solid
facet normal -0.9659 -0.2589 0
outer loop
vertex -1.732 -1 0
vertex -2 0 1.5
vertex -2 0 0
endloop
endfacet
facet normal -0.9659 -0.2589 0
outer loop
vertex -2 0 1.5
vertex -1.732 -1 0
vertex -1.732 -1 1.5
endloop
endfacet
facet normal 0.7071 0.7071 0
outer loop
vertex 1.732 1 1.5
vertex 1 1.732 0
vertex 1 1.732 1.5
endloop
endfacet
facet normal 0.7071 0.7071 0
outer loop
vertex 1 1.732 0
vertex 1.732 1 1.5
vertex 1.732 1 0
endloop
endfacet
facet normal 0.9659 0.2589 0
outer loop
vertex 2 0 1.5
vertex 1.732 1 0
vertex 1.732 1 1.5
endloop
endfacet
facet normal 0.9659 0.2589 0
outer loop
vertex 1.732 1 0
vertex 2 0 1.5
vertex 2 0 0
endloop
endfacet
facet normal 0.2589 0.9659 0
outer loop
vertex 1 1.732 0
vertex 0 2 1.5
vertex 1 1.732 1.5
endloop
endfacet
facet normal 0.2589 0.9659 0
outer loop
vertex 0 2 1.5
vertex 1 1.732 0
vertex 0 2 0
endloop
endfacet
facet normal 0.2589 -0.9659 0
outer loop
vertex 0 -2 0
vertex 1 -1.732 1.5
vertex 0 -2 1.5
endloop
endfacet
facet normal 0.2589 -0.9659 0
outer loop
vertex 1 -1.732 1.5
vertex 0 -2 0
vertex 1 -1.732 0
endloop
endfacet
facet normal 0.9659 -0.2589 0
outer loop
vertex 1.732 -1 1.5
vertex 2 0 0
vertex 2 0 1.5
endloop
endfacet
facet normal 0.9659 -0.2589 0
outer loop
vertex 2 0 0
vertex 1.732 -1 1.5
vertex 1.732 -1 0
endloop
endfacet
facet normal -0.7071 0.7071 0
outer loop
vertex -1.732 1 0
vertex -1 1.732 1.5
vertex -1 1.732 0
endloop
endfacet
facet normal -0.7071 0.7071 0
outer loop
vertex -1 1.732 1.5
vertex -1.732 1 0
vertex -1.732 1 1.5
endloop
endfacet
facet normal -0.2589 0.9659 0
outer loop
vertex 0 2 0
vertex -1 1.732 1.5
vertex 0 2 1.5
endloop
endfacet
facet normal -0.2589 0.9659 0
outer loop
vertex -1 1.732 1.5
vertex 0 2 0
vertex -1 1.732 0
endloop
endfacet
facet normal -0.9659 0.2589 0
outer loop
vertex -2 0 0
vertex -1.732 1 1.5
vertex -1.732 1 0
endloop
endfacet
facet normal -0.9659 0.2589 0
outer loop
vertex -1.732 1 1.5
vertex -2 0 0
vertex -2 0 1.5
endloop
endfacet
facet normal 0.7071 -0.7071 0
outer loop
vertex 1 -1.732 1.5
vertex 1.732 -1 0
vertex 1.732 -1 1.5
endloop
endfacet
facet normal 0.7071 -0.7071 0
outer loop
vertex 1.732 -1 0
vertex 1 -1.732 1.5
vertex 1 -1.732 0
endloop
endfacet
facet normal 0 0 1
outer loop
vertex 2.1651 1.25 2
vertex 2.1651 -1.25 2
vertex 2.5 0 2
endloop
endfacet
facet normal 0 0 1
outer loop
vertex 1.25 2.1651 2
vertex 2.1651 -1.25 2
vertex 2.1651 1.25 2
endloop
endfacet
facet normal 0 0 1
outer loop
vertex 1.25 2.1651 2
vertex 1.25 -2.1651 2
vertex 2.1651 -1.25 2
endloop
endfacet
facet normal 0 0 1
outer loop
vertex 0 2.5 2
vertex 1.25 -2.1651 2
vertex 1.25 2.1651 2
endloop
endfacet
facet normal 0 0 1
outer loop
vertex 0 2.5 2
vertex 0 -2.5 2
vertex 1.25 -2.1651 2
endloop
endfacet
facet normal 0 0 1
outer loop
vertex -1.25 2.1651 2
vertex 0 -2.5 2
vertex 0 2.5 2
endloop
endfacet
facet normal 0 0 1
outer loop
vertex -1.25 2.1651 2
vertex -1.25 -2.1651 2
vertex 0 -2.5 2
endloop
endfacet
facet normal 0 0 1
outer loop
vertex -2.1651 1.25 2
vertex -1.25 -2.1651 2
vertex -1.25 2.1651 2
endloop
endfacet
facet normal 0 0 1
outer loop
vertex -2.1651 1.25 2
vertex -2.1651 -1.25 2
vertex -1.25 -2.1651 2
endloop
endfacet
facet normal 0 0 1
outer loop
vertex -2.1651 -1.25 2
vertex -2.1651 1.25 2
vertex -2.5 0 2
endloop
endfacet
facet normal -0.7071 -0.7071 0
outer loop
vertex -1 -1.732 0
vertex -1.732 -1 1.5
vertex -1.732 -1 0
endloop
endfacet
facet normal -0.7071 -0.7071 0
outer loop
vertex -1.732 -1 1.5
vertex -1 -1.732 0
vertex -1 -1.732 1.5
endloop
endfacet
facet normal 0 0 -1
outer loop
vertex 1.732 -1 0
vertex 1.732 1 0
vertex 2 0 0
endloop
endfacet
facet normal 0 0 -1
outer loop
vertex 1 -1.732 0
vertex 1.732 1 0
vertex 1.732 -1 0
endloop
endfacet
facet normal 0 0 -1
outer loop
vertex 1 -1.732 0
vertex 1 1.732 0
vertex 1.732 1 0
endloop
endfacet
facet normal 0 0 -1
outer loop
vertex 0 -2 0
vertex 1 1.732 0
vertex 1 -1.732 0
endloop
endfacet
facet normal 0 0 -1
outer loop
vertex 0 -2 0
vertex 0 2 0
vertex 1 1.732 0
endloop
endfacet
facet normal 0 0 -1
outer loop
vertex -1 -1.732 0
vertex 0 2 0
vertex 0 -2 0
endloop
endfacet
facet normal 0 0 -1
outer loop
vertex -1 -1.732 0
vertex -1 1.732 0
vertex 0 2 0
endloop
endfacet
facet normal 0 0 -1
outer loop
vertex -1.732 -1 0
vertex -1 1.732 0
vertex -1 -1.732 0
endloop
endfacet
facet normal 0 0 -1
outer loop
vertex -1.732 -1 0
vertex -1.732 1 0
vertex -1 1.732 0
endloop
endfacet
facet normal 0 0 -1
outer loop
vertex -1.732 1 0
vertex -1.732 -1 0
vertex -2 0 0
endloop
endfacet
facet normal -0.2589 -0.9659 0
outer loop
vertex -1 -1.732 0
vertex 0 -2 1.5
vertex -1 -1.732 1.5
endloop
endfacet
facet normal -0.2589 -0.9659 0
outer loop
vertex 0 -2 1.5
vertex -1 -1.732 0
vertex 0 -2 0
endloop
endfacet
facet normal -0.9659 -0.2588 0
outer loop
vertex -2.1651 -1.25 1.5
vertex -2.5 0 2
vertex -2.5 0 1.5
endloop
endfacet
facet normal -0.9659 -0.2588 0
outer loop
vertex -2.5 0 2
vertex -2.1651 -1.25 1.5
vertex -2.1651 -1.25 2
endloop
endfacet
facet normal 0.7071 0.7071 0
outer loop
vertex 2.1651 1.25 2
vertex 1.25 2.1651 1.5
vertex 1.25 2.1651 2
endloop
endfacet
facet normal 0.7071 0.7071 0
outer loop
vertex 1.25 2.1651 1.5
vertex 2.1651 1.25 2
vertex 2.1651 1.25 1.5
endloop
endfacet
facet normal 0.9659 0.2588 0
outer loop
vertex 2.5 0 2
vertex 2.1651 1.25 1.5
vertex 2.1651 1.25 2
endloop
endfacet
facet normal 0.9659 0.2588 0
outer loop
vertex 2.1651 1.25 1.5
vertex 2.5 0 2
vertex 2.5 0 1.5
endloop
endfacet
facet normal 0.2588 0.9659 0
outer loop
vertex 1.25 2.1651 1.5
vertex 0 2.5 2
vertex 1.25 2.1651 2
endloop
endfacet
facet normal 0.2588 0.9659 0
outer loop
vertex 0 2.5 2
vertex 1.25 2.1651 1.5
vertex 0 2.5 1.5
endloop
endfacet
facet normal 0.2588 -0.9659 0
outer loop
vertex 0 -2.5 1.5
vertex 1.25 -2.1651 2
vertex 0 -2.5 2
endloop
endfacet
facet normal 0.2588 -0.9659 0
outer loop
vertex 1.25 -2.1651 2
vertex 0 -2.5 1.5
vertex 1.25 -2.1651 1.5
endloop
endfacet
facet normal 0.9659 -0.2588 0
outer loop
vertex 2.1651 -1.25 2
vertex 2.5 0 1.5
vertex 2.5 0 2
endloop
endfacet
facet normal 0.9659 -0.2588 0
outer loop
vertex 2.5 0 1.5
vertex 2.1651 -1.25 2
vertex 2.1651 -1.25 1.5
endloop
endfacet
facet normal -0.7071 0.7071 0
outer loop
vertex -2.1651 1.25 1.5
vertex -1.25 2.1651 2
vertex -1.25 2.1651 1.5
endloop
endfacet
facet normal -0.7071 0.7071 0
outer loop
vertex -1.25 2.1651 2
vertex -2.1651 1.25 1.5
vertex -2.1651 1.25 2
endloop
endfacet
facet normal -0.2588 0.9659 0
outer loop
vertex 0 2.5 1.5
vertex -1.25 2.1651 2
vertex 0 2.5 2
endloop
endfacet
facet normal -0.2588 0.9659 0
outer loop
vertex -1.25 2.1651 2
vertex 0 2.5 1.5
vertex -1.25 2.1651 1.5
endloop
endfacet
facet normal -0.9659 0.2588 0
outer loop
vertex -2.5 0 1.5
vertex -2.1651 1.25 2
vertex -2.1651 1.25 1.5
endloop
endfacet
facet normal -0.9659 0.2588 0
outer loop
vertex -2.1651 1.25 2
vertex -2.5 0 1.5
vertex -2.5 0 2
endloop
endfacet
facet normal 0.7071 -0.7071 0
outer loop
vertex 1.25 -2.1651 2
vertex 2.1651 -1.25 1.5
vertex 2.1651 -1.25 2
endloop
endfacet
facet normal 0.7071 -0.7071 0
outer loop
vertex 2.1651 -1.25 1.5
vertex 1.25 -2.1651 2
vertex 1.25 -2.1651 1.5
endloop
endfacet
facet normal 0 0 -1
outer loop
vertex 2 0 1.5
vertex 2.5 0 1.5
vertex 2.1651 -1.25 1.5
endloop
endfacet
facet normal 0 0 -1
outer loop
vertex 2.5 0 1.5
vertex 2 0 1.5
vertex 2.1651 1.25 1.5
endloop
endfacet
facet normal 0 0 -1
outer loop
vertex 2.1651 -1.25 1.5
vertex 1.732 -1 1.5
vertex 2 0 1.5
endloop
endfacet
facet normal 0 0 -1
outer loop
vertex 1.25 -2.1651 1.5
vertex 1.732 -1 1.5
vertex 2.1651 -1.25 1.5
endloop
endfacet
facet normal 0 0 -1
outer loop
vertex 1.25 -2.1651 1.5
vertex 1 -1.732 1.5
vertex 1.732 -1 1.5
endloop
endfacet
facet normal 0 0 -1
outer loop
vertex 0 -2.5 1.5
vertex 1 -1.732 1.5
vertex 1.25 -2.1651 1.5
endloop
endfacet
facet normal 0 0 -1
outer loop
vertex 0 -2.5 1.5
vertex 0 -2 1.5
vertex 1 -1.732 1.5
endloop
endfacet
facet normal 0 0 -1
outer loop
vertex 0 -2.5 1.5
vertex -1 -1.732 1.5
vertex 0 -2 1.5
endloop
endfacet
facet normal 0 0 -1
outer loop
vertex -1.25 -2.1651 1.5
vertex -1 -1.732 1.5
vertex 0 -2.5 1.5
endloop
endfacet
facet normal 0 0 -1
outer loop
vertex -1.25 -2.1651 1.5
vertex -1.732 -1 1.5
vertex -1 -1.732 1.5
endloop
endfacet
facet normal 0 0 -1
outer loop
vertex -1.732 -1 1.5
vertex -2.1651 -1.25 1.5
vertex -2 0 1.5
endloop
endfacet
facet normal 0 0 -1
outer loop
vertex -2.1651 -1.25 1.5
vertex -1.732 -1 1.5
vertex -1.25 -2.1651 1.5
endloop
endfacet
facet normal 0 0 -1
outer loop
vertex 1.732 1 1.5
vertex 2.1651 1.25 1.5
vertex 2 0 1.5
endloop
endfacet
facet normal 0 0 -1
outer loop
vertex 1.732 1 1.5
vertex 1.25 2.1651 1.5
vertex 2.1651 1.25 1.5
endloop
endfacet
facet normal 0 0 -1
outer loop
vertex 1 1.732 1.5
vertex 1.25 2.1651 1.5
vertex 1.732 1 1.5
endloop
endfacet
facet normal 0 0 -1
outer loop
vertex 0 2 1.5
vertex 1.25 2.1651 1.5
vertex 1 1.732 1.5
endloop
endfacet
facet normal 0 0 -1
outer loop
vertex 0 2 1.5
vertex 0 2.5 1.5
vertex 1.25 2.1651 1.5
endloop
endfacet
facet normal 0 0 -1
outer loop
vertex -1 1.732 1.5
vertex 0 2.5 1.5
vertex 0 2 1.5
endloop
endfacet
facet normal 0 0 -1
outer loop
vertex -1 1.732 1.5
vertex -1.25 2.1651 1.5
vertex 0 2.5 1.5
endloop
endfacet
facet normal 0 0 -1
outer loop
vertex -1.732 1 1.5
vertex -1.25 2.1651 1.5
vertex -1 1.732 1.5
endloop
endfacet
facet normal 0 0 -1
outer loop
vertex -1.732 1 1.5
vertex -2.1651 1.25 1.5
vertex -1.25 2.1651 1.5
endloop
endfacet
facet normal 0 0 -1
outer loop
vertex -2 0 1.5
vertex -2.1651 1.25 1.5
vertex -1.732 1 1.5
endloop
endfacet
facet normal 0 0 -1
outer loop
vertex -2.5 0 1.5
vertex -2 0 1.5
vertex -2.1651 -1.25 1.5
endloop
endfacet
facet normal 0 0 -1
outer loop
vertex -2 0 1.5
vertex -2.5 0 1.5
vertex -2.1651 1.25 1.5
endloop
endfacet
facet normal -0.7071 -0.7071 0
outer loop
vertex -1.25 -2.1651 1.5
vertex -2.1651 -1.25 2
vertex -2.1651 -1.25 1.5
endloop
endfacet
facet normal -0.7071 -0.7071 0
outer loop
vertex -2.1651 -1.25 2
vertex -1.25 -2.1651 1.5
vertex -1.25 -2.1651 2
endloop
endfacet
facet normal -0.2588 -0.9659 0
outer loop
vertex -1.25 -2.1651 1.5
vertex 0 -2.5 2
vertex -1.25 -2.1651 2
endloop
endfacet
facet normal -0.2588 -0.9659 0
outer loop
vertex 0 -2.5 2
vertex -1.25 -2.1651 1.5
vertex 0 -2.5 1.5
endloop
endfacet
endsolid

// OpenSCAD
// plate round 1x1 wo stud

// external vars #########################

// part ##################################

module plate_round_1x1_wo_stud() {
  $fn = 12;
  union() { cylinder(h=2,d=4); translate([0,0,1.5]) cylinder(h=0.5,d=5); }
}

plate_round_1x1_wo_stud();
